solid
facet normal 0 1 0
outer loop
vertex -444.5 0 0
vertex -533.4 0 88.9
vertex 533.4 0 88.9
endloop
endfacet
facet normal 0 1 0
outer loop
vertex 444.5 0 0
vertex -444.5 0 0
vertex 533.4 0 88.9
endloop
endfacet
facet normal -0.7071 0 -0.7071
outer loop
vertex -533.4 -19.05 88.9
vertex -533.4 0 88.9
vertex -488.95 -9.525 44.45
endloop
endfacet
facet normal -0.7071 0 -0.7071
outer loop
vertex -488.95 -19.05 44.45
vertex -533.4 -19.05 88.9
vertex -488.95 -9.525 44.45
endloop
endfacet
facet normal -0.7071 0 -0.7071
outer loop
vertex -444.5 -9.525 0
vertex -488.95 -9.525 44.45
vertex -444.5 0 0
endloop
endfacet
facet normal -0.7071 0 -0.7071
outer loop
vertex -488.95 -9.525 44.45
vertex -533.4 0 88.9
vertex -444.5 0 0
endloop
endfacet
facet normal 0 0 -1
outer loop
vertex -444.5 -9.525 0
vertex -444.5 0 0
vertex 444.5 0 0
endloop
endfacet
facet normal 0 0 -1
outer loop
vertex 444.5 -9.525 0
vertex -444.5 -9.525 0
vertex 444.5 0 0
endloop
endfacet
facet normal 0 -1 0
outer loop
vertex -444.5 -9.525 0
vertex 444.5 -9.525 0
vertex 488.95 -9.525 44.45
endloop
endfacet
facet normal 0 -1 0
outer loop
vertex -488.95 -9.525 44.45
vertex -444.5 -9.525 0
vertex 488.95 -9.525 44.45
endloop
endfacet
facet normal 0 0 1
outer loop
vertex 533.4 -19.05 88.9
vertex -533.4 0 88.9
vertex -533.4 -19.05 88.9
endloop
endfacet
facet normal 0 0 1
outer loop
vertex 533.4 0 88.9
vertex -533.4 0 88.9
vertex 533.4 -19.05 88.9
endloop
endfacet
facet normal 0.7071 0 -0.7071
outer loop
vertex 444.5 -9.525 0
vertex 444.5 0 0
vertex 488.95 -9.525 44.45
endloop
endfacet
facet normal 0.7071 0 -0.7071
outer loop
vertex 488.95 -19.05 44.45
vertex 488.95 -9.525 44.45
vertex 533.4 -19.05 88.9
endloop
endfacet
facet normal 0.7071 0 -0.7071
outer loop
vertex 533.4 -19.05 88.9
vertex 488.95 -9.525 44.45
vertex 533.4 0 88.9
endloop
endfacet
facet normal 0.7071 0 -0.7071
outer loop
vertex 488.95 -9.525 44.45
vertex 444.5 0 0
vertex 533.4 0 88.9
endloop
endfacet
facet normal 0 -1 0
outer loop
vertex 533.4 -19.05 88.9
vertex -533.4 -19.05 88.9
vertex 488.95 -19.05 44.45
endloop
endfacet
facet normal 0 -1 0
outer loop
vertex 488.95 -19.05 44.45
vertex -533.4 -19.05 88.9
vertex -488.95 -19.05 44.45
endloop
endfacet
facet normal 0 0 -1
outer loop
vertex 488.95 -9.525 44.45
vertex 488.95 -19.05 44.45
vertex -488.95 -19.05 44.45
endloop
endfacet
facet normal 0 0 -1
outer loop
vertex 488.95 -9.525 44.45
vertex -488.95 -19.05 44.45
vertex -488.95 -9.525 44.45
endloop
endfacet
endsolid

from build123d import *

# Parameters (mm, degrees)
F0_W     = 1066.8
F0_H     = 88.9
F1_DEPTH = 19.05
F2_W     = 9.525
F2_H     = 44.45
F3_DEPTH = 1066.801
F5_DEPTH = 19.051


with BuildPart() as f1:
    # F0 (on Front) → F1 (new body)
    with BuildSketch(Plane.XZ):
        with Locations((0, 44.45)):
            Rectangle(F0_W, F0_H)
    extrude(amount=F1_DEPTH)

    # F2 (on face) → F3 (cut, through all)
    with BuildSketch(Plane.YZ.offset(533.4)):
        with Locations((-14.2875, 22.225)):
            Rectangle(F2_W, F2_H)
    extrude(amount=-F3_DEPTH, mode=Mode.SUBTRACT)

    # F4 (on face) → F5 (cut, through all)
    with BuildSketch(Plane(origin=(0, 0, 0), x_dir=(-1, 0, 0), z_dir=(0, 1, 0))):
        Polygon((-444.5, 0), (-533.4, 88.9), (-533.4, 0), align=None)
        Polygon((444.5, 0), (533.4, 0), (533.4, 88.9), align=None)
    extrude(amount=-F5_DEPTH, mode=Mode.SUBTRACT)


solid = f1.part
